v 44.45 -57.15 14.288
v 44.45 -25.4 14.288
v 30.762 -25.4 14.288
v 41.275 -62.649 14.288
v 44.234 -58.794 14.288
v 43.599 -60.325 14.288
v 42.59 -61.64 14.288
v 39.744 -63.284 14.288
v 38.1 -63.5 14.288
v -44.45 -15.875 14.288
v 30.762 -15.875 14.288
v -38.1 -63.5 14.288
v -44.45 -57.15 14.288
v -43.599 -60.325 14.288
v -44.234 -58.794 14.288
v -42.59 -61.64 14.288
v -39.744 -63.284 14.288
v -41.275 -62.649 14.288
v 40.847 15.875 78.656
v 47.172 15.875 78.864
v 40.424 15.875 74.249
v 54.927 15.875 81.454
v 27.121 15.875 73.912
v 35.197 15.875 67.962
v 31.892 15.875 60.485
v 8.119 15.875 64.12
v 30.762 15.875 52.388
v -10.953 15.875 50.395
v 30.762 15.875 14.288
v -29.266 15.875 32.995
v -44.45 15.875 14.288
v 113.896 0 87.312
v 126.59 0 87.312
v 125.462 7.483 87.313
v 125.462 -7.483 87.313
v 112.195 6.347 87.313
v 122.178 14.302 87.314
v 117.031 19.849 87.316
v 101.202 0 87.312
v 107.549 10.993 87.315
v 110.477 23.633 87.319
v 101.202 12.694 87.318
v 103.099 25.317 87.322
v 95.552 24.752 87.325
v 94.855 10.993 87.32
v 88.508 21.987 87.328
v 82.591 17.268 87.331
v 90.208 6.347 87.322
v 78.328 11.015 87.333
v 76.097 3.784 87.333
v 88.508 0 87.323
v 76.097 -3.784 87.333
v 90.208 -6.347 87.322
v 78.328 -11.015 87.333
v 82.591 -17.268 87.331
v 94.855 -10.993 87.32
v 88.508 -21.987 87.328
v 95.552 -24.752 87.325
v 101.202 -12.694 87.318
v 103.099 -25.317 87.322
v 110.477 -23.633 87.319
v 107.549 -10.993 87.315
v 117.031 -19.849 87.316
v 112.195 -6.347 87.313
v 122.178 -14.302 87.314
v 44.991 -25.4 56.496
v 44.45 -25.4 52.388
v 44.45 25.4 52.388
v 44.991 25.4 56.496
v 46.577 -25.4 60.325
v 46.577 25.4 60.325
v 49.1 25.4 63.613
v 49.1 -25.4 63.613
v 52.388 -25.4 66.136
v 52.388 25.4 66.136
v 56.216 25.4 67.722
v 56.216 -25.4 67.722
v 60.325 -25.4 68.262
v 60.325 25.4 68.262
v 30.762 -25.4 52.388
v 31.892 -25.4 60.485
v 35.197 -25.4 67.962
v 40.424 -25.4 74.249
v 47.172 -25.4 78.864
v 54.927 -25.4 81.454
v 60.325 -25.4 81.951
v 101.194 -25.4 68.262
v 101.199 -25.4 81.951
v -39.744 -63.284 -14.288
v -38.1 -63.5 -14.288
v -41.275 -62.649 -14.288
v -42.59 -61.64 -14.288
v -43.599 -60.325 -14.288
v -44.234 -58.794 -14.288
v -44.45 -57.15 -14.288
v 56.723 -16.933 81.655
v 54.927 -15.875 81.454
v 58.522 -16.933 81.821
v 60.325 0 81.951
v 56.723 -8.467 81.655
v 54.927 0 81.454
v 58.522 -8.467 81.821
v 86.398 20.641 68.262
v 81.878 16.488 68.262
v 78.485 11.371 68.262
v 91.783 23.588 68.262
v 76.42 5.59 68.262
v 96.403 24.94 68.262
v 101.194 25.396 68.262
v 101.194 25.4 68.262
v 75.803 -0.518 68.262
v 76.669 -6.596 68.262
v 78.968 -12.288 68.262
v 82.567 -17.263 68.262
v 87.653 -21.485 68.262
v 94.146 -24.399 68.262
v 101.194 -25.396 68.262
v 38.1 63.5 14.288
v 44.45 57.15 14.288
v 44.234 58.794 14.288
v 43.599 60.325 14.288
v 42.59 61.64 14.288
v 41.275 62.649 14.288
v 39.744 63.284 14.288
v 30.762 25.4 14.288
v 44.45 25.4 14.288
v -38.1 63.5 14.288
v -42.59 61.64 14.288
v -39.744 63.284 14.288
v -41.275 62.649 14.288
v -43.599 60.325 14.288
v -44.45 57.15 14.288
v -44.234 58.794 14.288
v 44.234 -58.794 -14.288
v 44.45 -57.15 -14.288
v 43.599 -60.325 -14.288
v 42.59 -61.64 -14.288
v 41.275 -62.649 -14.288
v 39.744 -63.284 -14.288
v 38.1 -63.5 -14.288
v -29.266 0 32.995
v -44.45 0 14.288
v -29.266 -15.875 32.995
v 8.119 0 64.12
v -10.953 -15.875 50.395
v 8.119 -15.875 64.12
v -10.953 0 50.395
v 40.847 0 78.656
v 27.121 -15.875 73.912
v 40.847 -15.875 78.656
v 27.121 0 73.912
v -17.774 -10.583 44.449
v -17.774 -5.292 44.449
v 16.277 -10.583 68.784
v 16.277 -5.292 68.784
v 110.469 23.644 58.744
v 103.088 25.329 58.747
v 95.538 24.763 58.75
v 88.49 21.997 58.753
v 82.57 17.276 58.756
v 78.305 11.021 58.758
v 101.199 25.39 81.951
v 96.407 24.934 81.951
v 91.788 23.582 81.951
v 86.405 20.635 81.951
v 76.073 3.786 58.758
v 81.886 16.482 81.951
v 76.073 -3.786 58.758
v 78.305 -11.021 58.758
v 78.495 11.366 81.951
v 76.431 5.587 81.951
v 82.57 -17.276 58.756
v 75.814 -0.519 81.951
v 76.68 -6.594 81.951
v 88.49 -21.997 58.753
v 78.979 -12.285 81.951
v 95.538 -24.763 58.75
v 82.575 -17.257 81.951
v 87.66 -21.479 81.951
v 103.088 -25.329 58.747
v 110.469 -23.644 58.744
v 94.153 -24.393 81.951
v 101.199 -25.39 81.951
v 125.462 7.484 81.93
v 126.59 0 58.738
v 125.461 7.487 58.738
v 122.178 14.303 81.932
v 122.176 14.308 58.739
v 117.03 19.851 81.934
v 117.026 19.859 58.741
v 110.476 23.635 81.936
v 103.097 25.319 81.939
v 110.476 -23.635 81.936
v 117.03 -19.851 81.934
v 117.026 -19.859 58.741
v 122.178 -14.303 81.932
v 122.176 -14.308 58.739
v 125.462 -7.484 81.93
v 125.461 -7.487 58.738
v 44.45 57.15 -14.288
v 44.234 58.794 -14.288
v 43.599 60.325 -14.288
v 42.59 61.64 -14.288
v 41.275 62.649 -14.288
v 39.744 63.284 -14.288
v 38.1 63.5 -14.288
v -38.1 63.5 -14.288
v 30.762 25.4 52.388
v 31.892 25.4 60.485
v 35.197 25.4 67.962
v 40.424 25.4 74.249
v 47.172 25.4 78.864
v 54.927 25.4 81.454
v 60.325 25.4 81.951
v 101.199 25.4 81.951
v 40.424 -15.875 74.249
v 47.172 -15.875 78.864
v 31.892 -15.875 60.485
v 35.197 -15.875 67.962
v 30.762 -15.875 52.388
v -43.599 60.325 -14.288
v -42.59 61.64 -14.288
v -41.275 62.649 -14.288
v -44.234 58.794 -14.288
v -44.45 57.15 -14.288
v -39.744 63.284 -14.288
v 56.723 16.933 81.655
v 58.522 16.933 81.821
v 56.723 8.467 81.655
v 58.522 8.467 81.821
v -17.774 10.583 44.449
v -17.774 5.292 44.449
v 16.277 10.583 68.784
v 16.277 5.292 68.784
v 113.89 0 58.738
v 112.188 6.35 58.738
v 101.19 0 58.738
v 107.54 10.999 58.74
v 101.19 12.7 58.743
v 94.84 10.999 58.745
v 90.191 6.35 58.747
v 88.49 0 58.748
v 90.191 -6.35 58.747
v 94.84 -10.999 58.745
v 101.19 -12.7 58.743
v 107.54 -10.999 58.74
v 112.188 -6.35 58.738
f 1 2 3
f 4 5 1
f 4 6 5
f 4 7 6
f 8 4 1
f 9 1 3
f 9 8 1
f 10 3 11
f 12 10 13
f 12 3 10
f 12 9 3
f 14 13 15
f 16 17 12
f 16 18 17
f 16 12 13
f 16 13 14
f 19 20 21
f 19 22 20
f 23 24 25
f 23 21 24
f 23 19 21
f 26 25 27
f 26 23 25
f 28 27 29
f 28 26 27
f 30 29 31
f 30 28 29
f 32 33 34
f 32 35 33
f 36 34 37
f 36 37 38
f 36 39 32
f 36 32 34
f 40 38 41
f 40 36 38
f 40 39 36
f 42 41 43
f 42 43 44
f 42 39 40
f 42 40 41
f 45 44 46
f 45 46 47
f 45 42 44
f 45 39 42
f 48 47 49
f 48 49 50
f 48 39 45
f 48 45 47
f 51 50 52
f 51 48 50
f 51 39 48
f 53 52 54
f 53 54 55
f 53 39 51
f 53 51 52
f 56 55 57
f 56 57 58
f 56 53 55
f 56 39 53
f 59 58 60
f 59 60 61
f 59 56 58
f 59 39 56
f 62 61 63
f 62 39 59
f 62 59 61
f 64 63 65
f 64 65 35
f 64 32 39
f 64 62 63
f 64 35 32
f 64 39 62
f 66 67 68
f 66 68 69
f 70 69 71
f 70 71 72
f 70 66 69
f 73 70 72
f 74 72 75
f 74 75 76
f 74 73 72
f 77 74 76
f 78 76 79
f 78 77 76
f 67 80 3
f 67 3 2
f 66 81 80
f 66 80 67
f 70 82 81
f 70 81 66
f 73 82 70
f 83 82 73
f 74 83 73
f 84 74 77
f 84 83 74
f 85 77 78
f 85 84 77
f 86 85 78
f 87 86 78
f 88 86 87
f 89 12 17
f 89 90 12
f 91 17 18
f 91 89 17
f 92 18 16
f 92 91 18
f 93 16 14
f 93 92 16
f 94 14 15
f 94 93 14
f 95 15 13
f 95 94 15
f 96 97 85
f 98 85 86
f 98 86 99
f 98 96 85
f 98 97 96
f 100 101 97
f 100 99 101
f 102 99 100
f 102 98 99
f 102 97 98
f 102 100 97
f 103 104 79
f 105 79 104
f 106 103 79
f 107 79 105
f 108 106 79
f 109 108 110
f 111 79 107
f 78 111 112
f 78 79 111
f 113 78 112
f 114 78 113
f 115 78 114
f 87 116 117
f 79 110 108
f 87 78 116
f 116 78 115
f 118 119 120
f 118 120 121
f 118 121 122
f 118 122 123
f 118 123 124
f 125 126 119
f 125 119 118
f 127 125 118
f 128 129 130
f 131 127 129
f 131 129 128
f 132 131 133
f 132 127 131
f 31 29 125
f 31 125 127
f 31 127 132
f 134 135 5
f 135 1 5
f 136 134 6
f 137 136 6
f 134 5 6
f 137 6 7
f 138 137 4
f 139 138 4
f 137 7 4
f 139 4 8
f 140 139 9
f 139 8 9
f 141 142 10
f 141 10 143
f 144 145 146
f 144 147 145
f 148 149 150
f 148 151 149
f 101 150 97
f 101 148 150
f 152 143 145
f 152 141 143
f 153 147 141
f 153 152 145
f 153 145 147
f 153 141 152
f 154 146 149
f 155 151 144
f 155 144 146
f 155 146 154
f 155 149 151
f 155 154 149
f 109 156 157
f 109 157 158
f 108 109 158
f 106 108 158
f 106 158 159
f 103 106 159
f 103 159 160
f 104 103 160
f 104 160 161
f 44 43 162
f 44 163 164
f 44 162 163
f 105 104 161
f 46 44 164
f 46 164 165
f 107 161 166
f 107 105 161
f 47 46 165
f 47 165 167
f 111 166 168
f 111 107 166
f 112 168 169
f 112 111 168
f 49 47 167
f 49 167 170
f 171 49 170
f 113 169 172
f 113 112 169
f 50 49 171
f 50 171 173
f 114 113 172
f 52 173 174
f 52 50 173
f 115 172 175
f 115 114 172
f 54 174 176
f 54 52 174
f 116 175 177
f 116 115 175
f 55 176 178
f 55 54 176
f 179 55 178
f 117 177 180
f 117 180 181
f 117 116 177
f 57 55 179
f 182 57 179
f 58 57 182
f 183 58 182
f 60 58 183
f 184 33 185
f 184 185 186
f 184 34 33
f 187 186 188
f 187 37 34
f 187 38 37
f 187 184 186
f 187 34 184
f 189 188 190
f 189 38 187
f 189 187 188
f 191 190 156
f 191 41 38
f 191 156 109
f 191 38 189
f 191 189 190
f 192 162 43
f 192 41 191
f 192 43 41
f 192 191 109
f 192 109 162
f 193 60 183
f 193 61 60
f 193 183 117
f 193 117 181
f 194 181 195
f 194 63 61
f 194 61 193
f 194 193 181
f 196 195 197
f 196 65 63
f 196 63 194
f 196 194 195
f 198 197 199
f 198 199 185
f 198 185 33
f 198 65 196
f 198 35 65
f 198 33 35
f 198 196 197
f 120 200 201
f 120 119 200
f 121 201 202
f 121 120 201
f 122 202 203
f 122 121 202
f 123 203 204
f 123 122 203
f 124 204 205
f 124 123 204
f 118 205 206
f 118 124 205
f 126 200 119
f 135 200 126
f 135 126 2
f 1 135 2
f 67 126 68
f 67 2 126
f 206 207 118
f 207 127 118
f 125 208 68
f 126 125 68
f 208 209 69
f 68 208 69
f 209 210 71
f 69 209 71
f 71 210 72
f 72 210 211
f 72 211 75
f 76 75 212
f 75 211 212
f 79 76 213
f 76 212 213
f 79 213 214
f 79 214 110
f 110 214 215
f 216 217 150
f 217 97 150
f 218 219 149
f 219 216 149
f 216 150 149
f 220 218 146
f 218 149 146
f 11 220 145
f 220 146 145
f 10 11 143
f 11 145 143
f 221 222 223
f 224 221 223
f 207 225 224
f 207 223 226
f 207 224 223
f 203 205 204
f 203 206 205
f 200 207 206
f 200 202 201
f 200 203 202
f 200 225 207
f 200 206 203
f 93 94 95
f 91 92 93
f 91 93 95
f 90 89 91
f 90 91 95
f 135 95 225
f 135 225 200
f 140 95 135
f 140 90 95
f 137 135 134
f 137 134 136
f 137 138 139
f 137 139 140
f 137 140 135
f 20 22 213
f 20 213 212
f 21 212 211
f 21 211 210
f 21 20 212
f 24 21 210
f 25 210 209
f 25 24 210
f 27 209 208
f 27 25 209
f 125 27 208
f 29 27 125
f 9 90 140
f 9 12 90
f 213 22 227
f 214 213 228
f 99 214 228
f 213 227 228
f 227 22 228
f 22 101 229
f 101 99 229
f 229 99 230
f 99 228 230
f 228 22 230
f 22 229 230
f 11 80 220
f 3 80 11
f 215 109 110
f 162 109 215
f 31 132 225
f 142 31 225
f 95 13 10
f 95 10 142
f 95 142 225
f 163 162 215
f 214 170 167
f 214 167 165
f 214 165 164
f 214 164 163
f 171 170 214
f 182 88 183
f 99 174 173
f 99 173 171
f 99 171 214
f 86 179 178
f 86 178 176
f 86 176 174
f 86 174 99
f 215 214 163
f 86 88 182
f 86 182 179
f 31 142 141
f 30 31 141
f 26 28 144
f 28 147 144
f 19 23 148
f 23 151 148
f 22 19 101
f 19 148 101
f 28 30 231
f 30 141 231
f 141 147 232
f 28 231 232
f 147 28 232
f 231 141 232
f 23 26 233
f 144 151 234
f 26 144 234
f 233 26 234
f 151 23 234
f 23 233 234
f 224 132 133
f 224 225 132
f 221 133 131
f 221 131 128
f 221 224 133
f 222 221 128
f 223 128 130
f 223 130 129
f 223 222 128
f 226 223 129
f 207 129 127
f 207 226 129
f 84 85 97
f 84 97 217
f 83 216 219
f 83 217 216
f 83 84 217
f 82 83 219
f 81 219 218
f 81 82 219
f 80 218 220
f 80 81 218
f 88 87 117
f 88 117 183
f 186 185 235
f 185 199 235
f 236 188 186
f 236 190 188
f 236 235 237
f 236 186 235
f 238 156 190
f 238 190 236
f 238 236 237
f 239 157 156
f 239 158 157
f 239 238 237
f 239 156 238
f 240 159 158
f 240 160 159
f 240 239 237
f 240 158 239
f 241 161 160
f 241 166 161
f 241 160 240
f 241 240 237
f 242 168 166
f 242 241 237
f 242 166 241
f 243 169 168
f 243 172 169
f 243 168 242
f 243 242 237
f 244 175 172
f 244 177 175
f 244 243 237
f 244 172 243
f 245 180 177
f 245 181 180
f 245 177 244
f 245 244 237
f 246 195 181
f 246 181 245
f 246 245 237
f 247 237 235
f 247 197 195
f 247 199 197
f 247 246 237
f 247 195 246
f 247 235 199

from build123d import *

# Parameters (mm, degrees)
F1_DEPTH = 63.5
F2_DEPTH = 25.4
F3_DEPTH = 15.875
F5_R     = 6.35


with BuildPart() as f1:
    # F0 (on Front) → F1 (new body, symmetric)
    with BuildSketch(Plane.XZ):
        Polygon((30.7617224753, 14.2875), (-44.45, 14.2875), (-44.45, -14.2875), (44.45, -14.2875), (44.45, 14.2875), align=None)
    extrude(amount=F1_DEPTH, both=True)

    # F0 (on Front) → F2 (join, symmetric)
    with BuildSketch(Plane.XZ):
        with BuildLine():
            Line((30.7617224753, 52.3875), (30.7617224753, 14.2875))
            Line((30.7617224753, 14.2875), (44.45, 14.2875))
            Line((44.45, 14.2875), (44.45, 52.3875))
            ThreePointArc((44.45, 52.3875), (49.0996798487, 63.6128201513), (60.325, 68.2625))
            Line((60.325, 68.2625), (75.7897496223, 68.2625))
            Line((75.7897496223, 68.2625), (75.7897496223, 81.9507775247))
            Line((75.7897496223, 81.9507775247), (60.325, 81.9507775247))
            add(Edge.make_bspline(
                [(54.9267858452, 81.4537460931), (56.7210795093, 81.6729876967), (58.5208597277, 81.8394540981), (60.325, 81.9507775247)],
                knots=[119.3724573368, 119.3724573368, 119.3724573368, 119.3724573368, 124.7241746831, 124.7241746831, 124.7241746831, 124.7241746831], degree=3))
            ThreePointArc((54.9267858452, 81.4537460931), (37.5920252585, 71.2872152731), (30.7617224753, 52.3875))
        make_face()
        Polygon((101.1993896154, 81.9507775247), (75.7897496223, 81.9507775247), (75.7897496223, 68.2625), (101.1937051574, 68.2625), align=None)
    extrude(amount=F2_DEPTH, both=True)

    # F0 (on Front) → F3 (join, symmetric)
    with BuildSketch(Plane.XZ):
        with BuildLine():
            add(Edge.make_bspline(
                [(-44.45, 14.2875), (-22.3885229669, 45.4157741444), (14.904260364, 76.5634637243), (54.9267858452, 81.4537460931)],
                knots=[0, 0, 0, 0, 119.3724573368, 119.3724573368, 119.3724573368, 119.3724573368], degree=3))
            Line((-44.45, 14.2875), (30.7617224753, 14.2875))
            Line((30.7617224753, 14.2875), (30.7617224753, 52.3875))
            ThreePointArc((30.7617224753, 52.3875), (37.5920252585, 71.2872152731), (54.9267858452, 81.4537460931))
        make_face()
    extrude(amount=F3_DEPTH, both=True)

    # F0 (on Front) → F4 (revolve)
    with BuildSketch(Plane.XZ):
        Polygon((101.2016162276, 87.3125), (101.1993896154, 81.9507775247), (101.1937051574, 68.2625), (101.1897496223, 58.7375), (126.5897496223, 58.7375), (126.5897496223, 87.3125), align=None)
    revolve(axis=Axis((101.195682925, 0, 73.025), (0.0004152792, 0, 0.9999999138)))

    # F5
    f5_edges = [f1.edges().sort_by_distance(p)[0] for p in [
        (-44.45, 63.5, 0),
        (-44.45, -63.5, 0),
        (44.45, 63.5, 0),
        (44.45, -63.5, 0),
    ]]
    fillet(f5_edges, radius=F5_R)


solid = f1.part
